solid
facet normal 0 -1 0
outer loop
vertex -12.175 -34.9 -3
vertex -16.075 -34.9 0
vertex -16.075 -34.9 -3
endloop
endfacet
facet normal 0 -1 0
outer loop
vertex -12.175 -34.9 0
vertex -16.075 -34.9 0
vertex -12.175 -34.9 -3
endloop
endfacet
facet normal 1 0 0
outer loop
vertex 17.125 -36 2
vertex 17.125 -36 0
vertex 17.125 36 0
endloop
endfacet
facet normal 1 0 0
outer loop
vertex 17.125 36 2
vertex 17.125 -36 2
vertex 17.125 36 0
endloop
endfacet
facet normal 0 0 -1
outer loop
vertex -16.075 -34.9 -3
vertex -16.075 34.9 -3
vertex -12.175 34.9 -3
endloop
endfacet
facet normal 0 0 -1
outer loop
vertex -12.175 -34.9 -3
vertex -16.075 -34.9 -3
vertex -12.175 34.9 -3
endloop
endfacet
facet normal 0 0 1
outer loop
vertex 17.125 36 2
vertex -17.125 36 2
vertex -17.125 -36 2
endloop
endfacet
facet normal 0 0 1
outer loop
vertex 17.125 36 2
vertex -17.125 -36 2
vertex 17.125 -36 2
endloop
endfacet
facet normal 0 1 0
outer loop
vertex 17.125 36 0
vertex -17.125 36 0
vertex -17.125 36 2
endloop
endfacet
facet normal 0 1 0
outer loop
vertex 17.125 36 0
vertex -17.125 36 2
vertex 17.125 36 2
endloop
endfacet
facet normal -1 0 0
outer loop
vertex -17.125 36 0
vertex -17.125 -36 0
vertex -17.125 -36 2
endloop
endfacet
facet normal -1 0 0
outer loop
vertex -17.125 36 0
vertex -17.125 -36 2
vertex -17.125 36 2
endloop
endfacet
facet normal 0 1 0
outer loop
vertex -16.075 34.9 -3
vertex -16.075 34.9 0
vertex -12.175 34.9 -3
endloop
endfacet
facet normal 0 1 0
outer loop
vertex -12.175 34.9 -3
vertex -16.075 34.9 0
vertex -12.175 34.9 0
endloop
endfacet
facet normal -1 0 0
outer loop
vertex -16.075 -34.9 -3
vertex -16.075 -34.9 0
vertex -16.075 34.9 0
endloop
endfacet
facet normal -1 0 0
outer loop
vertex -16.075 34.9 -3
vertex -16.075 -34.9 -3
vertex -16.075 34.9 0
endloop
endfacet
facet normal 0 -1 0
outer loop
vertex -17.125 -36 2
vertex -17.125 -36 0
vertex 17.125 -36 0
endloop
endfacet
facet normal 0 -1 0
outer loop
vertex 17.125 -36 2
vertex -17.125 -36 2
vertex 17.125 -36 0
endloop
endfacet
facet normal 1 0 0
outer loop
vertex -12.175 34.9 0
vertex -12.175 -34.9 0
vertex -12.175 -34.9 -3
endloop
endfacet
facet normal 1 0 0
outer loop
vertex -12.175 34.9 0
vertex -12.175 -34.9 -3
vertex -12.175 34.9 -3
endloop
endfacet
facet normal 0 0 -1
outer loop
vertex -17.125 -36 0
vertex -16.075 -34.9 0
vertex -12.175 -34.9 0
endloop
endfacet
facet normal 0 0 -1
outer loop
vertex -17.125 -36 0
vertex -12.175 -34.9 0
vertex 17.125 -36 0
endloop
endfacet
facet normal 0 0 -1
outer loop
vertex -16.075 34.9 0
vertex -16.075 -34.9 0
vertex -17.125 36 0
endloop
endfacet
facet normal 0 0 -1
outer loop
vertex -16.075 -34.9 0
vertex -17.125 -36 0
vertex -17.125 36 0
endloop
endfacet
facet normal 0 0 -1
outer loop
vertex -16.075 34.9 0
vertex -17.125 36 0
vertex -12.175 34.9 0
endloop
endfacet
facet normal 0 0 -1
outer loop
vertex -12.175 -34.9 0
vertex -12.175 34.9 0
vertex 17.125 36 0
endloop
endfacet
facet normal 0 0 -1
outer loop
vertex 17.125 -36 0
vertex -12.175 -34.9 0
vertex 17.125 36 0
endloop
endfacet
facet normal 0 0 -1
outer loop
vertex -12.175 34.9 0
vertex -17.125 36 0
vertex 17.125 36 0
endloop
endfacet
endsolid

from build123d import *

# Parameters (mm, degrees)
SKETCH_W     = 34.25
SKETCH_H     = 72
PAD_DEPTH    = 2
SKETCH001_W  = 3.9
SKETCH001_H  = 69.8
PAD001_DEPTH = 3


with BuildPart() as part:
    # Sketch → Pad (new body)
    with BuildSketch(Plane.XY):
        Rectangle(SKETCH_W, SKETCH_H)
    extrude(amount=PAD_DEPTH)

    # Sketch001 → Pad001 (join)
    with BuildSketch(Plane.XY):
        with Locations((-14.125, 0)):
            Rectangle(SKETCH001_W, SKETCH001_H)
    extrude(amount=-PAD001_DEPTH)


solid = part.part
